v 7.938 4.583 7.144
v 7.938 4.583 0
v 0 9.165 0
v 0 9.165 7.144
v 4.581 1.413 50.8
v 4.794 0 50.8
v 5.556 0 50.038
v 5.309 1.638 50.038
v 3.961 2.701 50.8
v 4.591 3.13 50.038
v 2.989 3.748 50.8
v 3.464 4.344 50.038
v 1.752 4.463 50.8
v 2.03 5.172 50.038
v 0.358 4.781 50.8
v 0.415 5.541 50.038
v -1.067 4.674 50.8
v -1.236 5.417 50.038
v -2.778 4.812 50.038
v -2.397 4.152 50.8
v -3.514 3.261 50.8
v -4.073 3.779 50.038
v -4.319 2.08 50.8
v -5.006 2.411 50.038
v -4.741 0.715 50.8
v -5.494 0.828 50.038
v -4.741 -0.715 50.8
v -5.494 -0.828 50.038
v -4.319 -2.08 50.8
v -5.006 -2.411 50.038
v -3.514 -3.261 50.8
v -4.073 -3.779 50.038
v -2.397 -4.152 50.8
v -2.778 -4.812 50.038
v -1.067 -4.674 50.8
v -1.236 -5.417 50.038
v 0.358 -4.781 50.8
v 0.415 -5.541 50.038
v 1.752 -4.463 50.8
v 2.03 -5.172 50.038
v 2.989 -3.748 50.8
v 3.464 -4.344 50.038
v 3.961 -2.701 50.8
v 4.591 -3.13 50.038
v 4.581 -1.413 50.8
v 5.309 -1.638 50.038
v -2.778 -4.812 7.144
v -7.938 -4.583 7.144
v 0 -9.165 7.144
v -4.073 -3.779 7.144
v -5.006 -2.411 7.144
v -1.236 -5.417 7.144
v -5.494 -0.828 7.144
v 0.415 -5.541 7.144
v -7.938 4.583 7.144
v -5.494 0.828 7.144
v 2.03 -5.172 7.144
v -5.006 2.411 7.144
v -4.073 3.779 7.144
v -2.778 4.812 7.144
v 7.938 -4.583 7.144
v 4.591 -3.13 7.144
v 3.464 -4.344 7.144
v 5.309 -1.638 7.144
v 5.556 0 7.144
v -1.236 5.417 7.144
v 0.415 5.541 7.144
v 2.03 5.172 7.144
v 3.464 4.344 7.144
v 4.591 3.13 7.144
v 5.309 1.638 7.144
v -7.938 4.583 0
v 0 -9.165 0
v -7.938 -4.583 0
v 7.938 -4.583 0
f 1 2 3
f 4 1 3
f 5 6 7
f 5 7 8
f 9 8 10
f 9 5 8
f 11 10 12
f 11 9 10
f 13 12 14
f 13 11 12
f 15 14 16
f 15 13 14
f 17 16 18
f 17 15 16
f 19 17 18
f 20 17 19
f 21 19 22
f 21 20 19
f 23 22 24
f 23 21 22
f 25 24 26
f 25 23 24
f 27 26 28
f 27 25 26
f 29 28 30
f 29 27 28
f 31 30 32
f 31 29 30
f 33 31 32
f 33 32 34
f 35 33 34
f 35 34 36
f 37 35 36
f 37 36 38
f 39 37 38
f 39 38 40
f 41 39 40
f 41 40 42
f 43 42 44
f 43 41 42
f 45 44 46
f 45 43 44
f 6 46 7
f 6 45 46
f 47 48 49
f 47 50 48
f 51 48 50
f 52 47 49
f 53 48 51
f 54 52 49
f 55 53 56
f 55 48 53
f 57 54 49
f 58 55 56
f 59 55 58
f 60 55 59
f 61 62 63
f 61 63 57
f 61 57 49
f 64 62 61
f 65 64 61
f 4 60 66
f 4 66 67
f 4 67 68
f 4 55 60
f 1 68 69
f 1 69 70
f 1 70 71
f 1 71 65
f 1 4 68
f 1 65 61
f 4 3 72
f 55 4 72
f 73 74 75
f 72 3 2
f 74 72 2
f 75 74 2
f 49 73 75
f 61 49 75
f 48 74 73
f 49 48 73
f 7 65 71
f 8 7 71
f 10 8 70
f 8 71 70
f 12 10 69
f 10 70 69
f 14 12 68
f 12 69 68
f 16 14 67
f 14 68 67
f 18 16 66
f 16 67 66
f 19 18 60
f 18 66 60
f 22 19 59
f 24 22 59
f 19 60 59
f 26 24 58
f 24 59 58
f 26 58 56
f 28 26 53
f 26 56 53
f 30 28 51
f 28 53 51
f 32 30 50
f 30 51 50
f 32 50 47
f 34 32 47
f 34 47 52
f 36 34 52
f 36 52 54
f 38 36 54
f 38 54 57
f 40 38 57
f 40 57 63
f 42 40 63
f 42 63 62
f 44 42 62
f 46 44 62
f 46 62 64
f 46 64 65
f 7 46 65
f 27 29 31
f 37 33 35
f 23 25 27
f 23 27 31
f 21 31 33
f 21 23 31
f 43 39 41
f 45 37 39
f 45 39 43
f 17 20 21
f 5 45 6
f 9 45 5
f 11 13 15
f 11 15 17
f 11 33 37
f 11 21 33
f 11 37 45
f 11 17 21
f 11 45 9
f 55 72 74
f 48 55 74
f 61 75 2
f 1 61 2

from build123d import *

# Parameters (mm, degrees)
F2_DEPTH = 7.14375
F0_R     = 5.55625
F3_DEPTH = 50.8
F5_SIZE  = 0.762


# Not quite as in the source:
# - a length typed as a fraction of an inch, garbled in the dataset ("3 / 203.2 mm" for 3/8 in), is restored


with BuildPart() as f2:
    # F1 (on Top) → F2 (new body)
    with BuildSketch(Plane.XY):
        Polygon((7.9375, 4.5827177617), (0, 9.1654355234), (-7.9375, 4.5827177617), (-7.9375, -4.5827177617), (0, -9.1654355234), (7.9375, -4.5827177617), align=None)
    extrude(amount=F2_DEPTH)

    # F0 (on Top) → F3 (join)
    with BuildSketch(Plane.XY):
        Circle(F0_R)
    extrude(amount=F3_DEPTH)

    # F5
    f5_edges = [f2.edges().sort_by_distance(p)[0] for p in [
        (-5.55625, 0, 50.8),
    ]]
    chamfer(f5_edges, length=F5_SIZE)


solid = f2.part
